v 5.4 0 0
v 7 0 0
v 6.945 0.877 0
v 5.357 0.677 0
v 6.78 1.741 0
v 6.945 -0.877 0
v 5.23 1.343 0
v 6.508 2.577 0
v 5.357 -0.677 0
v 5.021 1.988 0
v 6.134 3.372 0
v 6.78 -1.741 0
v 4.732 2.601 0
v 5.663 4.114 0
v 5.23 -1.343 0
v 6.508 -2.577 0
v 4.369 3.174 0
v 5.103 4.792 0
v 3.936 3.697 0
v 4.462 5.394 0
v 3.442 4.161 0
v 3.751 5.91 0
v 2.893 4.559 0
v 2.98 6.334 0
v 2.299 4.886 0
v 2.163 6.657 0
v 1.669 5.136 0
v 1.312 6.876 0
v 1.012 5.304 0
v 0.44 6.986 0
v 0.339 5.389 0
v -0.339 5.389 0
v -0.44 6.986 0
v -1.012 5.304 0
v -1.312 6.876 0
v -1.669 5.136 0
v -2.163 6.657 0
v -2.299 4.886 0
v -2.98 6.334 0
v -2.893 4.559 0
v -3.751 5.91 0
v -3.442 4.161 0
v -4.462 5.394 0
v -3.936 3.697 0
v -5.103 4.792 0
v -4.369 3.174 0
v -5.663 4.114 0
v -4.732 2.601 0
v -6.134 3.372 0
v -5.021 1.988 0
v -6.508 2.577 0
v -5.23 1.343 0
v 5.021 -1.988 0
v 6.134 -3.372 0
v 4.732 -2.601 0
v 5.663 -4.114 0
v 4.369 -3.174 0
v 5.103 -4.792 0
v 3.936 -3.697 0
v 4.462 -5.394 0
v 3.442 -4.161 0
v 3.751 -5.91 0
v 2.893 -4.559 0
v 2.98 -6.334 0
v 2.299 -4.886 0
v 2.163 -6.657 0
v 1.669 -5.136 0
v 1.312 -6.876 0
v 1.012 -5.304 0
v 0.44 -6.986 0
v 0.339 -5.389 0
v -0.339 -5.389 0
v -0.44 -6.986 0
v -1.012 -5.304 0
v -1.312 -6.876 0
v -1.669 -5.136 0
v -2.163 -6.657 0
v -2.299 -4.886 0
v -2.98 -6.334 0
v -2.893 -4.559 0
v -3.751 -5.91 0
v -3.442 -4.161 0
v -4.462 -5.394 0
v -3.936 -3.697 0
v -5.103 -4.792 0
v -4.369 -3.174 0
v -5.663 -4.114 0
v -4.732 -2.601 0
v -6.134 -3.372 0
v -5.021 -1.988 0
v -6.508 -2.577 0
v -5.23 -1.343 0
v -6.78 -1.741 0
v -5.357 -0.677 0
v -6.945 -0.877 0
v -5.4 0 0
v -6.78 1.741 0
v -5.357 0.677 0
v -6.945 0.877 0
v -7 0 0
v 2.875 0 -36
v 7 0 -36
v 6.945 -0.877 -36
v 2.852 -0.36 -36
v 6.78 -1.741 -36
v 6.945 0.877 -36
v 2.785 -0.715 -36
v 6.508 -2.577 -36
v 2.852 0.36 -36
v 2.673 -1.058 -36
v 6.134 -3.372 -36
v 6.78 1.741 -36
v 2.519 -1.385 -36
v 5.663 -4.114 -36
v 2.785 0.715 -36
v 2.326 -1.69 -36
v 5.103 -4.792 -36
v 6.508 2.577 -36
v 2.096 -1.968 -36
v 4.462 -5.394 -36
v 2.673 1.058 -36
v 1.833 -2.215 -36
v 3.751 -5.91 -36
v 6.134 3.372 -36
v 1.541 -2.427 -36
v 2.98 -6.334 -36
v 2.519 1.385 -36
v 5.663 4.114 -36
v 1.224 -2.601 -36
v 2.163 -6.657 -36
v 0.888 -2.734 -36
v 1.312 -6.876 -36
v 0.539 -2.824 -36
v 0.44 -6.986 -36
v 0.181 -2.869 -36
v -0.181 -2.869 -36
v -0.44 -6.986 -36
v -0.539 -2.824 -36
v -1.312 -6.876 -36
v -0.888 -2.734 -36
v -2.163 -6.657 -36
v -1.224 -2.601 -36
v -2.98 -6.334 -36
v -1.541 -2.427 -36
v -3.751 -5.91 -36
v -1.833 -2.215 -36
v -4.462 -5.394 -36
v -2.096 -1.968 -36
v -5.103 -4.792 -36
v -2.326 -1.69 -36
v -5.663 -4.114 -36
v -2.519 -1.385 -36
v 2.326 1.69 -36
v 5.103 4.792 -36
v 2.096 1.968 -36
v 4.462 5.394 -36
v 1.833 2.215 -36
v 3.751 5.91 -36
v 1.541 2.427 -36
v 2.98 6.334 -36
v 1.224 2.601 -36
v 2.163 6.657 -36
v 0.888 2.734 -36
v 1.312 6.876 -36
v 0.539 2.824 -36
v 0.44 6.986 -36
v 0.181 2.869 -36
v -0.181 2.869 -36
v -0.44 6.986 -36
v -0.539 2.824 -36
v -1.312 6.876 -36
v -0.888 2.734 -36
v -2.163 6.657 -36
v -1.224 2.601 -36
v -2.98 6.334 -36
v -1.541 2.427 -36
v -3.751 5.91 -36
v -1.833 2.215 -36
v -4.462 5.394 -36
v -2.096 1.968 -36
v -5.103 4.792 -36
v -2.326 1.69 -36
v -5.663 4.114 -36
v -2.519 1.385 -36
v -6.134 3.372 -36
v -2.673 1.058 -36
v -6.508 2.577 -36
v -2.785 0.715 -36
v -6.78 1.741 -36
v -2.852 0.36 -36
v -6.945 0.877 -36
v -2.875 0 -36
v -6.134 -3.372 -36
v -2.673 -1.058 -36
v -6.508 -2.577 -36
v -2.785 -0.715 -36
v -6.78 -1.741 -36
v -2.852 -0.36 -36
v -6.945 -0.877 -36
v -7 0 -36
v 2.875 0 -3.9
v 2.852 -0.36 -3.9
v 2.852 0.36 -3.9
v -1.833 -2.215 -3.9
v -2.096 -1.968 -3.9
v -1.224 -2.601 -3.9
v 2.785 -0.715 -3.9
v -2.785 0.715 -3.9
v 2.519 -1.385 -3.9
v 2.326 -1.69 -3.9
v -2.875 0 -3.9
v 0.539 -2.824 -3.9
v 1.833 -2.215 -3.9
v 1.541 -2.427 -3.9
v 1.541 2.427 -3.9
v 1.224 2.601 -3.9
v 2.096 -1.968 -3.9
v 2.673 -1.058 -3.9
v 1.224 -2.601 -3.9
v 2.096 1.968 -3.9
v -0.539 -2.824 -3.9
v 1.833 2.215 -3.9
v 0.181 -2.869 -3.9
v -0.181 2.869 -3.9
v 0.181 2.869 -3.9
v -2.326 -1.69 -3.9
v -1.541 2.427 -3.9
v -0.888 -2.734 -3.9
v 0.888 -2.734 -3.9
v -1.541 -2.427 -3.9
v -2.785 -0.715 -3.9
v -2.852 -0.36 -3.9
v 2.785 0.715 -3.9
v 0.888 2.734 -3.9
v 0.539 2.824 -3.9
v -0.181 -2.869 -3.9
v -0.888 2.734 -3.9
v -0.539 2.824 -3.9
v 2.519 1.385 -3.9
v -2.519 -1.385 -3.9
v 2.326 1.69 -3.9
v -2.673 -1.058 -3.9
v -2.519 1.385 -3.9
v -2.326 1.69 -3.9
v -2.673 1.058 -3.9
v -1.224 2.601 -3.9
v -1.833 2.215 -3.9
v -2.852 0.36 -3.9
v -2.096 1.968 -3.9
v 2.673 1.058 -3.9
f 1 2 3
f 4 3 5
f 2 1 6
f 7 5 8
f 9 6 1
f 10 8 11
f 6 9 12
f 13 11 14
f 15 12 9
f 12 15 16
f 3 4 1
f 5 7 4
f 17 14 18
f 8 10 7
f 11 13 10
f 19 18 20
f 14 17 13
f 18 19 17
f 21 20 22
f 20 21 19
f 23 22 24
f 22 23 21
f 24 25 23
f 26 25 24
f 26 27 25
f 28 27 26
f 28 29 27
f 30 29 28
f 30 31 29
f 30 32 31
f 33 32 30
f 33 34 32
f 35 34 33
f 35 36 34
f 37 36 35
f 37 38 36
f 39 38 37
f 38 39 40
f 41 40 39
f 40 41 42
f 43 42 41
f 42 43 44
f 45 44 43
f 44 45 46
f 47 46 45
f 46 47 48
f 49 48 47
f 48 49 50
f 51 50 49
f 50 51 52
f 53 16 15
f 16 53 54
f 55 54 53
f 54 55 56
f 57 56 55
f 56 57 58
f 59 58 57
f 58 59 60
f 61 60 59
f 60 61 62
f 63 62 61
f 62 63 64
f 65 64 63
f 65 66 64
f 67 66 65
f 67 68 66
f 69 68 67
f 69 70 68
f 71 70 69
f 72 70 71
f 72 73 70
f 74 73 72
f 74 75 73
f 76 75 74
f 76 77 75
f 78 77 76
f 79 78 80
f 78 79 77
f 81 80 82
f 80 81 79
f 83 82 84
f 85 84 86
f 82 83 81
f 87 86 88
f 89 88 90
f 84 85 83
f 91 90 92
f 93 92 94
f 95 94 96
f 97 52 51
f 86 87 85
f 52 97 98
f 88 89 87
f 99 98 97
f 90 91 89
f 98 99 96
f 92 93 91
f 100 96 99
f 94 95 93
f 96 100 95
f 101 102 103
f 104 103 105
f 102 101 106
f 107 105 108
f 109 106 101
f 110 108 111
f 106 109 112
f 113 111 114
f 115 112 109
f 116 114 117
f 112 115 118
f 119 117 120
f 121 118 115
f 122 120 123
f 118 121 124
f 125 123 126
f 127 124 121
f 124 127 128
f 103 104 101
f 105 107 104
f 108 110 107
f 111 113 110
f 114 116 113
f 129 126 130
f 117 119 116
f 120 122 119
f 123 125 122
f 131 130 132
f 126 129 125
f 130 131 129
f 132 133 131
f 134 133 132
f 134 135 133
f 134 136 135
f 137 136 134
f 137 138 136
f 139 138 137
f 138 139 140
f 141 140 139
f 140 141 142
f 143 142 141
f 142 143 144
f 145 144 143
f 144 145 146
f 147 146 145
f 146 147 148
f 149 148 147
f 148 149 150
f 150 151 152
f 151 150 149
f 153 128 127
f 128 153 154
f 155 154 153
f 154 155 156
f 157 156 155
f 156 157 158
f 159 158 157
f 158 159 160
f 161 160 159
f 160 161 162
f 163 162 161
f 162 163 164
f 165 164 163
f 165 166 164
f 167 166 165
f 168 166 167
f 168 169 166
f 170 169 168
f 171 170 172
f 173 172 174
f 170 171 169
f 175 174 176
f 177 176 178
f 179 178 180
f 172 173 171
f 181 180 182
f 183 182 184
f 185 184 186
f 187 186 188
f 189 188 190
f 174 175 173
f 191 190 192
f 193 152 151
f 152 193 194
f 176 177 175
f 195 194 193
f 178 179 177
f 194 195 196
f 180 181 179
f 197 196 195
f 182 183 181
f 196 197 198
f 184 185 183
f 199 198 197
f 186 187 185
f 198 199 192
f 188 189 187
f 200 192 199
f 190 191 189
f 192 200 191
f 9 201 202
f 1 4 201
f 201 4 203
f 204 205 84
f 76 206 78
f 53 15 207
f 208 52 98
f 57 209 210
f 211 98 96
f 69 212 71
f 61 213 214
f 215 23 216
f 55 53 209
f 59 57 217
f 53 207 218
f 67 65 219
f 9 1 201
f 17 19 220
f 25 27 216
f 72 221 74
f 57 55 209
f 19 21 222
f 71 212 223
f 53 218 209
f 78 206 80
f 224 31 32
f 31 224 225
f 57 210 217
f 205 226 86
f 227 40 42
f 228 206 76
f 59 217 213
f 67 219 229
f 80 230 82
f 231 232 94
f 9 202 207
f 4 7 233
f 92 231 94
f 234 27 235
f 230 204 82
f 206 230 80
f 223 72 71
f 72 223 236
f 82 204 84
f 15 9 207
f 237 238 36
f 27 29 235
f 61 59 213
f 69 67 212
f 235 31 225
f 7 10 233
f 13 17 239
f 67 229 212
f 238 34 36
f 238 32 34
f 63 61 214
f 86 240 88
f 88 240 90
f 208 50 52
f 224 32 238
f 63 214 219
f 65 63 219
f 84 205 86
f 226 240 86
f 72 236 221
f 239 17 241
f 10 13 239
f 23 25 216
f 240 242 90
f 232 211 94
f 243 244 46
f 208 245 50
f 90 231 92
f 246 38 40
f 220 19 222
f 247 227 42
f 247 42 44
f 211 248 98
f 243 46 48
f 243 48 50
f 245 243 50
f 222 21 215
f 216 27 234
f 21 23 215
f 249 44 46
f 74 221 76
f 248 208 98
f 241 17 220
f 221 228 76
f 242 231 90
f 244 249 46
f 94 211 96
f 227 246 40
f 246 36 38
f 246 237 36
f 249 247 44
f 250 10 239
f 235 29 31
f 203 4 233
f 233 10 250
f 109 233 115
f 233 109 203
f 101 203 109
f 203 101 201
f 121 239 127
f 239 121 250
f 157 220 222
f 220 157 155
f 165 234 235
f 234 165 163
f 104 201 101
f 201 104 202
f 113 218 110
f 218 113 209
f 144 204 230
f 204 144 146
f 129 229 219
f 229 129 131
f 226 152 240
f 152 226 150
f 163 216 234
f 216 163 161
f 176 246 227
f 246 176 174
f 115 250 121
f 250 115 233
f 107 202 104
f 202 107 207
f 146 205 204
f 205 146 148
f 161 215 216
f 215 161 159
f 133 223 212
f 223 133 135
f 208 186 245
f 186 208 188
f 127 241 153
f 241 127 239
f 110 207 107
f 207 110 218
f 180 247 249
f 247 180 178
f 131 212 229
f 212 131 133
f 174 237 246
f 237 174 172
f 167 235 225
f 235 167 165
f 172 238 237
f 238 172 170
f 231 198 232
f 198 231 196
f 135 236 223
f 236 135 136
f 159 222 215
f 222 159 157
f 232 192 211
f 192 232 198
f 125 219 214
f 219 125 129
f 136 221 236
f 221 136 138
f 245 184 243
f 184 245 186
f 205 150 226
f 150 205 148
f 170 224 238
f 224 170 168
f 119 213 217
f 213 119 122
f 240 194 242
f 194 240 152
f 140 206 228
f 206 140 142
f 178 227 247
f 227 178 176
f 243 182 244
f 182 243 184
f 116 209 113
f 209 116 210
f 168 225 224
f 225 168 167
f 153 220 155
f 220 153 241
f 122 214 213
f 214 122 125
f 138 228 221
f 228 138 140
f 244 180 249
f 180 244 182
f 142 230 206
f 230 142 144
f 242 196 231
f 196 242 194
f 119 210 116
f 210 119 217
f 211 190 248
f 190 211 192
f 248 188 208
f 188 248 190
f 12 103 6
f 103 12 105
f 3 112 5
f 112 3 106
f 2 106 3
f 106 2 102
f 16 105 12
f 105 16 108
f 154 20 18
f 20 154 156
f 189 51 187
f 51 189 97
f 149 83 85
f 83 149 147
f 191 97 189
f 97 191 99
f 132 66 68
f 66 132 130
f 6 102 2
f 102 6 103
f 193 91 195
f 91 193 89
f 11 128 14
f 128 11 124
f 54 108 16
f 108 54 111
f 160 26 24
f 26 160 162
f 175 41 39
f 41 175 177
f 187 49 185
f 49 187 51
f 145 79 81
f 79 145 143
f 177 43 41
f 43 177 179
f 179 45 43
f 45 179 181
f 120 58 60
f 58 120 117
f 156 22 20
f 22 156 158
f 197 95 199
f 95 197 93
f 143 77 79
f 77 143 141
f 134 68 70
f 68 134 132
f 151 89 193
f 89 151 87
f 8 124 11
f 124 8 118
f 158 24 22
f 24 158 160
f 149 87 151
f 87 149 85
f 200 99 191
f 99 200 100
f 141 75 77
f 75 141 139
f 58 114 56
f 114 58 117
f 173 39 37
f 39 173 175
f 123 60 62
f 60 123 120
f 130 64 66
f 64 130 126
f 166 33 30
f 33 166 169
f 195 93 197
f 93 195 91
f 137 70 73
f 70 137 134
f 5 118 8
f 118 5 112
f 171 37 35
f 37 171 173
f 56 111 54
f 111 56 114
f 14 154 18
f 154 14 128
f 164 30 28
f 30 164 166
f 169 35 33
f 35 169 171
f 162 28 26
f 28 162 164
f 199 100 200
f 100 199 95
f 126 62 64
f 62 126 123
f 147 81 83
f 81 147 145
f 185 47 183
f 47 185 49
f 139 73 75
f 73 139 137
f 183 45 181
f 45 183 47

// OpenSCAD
$fn = 50;


difference() {
	union() {
		translate(v = [0, 0, -36.0000000000]) {
			cylinder(h = 36, r = 7.0000000000);
		}
	}
	union() {
		translate(v = [0, 0, 0]) {
			rotate(a = [0, 0, 0]) {
				difference() {
					union() {
						#translate(v = [0, 0, -36.0000000000]) {
							cylinder(h = 36, r = 2.6000000000);
						}
						#translate(v = [0, 0, -3.9000000000]) {
							cylinder(h = 3.9000000000, r1 = 2.8750000000, r2 = 5.4000000000);
						}
						#translate(v = [0, 0, -36.0000000000]) {
							cylinder(h = 36, r = 2.8750000000);
						}
						#translate(v = [0, 0, -36.0000000000]) {
							cylinder(h = 36, r = 2.6000000000);
						}
					}
					union();
				}
			}
		}
	}
}
